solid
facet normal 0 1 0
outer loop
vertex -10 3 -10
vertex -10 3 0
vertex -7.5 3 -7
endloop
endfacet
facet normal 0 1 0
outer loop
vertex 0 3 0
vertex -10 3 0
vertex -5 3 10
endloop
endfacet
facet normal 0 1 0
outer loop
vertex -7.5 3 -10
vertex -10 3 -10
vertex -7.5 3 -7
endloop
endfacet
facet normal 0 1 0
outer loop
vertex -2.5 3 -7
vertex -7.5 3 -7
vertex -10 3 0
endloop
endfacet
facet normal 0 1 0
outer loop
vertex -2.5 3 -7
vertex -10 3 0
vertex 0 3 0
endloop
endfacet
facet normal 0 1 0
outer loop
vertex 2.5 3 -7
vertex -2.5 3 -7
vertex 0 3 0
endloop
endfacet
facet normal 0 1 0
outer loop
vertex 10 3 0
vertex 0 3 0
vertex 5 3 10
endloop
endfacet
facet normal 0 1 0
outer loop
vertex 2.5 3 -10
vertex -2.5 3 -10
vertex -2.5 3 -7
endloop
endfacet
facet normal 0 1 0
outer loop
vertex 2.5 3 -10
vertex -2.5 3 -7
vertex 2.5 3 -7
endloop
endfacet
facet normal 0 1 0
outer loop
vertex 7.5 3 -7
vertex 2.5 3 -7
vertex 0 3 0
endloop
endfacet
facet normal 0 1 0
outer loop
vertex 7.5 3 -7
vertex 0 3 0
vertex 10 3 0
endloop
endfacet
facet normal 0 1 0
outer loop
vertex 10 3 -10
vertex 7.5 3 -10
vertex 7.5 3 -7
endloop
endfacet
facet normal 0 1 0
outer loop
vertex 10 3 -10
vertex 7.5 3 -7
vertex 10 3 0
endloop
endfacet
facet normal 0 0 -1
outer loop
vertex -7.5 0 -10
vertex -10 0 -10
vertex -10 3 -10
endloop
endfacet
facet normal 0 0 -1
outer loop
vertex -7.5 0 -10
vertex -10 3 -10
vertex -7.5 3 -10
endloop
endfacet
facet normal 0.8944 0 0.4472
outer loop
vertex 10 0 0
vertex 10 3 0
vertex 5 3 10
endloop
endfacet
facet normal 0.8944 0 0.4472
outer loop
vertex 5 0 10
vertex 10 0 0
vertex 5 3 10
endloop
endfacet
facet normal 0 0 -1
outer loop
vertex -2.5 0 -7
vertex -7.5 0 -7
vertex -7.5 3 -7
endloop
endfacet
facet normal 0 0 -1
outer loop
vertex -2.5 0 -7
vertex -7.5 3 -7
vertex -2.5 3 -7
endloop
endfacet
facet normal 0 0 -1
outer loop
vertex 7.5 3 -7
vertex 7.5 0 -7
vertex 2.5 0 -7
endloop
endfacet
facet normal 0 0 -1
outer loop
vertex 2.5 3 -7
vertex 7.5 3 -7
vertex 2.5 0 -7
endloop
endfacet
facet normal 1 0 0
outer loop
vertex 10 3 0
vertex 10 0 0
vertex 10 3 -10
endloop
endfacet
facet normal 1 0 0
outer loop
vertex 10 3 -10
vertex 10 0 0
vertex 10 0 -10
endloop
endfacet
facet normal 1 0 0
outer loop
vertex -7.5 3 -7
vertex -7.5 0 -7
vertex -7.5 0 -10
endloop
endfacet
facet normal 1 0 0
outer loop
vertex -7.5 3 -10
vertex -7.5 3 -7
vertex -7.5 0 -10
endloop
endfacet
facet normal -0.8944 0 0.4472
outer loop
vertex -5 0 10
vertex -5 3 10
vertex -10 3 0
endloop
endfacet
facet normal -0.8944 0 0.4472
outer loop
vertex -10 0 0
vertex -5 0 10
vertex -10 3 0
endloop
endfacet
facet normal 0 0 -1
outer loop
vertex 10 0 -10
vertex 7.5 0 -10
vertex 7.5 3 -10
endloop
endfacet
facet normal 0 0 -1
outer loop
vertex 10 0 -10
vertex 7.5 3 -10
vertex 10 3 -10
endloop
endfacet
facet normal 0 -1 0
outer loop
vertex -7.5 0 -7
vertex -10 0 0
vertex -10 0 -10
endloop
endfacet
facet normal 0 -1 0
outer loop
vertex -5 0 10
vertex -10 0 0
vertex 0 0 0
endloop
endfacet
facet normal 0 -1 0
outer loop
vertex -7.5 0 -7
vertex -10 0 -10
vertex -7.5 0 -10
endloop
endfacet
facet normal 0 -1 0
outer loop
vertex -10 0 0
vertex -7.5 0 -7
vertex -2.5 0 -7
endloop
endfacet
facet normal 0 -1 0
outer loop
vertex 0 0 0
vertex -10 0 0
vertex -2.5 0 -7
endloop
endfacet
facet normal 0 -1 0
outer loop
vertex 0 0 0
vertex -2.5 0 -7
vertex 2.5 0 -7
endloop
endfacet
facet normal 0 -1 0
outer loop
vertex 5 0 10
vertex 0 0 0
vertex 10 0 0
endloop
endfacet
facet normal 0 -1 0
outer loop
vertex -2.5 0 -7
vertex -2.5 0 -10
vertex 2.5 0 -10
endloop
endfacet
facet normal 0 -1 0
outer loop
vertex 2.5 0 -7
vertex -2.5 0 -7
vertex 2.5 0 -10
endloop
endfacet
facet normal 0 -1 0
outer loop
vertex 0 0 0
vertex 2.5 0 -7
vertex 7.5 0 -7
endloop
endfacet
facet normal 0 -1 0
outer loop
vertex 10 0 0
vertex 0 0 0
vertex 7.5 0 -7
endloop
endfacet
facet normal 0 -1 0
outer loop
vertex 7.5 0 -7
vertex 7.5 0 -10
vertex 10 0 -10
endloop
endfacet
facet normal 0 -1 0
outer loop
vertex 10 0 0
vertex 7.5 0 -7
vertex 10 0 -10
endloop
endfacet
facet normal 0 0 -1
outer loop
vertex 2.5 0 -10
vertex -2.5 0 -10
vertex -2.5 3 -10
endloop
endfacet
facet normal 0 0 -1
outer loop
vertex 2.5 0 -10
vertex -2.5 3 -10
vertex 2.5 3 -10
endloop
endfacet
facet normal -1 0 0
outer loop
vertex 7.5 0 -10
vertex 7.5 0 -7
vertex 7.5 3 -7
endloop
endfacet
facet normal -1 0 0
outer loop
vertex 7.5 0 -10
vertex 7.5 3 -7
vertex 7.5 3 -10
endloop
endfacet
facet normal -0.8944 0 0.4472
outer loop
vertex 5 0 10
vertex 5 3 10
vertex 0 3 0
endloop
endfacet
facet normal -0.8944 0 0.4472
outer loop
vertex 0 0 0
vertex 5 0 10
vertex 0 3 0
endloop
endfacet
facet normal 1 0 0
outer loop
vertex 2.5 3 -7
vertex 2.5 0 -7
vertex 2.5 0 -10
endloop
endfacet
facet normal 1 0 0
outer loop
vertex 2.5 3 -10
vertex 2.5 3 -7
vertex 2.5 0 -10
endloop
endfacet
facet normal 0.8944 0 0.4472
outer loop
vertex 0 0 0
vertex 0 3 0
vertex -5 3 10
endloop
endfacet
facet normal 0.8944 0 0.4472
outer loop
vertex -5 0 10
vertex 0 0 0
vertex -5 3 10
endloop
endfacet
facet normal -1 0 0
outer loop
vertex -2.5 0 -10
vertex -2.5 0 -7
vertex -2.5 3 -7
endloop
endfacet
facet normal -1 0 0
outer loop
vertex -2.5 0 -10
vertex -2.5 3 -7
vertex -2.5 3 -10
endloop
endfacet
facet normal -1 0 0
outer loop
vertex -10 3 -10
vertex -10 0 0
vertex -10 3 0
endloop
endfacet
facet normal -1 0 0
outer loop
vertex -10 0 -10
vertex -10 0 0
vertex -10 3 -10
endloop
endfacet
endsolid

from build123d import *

# Parameters (mm, degrees)
SKETCH1_W               = 20
SKETCH1_H               = 20
BOSS_EXTRUDE1_DEPTH     = 3
CUT_EXTRUDE1_DEPTH      = 1
CUT_EXTRUDE1_DEPTH_BACK = 4
CUT_EXTRUDE2_START      = -4
SKETCH3_W               = 5
SKETCH3_H               = 3
CUT_EXTRUDE2_DEPTH      = 5


with BuildPart() as part:
    # Sketch1 → Boss-Extrude1 (new body)
    with BuildSketch(Plane(origin=(0, 0, 0), x_dir=(1, 0, 0), z_dir=(0, 1, 0))):
        Rectangle(SKETCH1_W, SKETCH1_H)
    extrude(amount=BOSS_EXTRUDE1_DEPTH)

    # Sketch2 → Cut-Extrude1 (cut, two sides)
    with BuildSketch(Plane(origin=(0, 3, 0), x_dir=(1, 0, 0), z_dir=(0, 1, 0))) as cut_extrude1_sk:
        Polygon((-5, -10), (-10, 0), (-10, -10), align=None)
        Polygon((0, 0), (-5, -10), (5, -10), align=None)
        Polygon((10, 0), (5, -10), (10, -10), align=None)
    extrude(amount=CUT_EXTRUDE1_DEPTH, mode=Mode.SUBTRACT)
    extrude(cut_extrude1_sk.sketch, amount=-CUT_EXTRUDE1_DEPTH_BACK, mode=Mode.SUBTRACT)

    # Sketch3 → Cut-Extrude2 (cut)
    with BuildSketch(Plane(origin=(0, 3, 0), x_dir=(1, 0, 0), z_dir=(0, 1, 0)).offset(CUT_EXTRUDE2_START)):
        with Locations((-5, 8.5)):
            Rectangle(SKETCH3_W, SKETCH3_H)
    cut_extrude2 = extrude(amount=CUT_EXTRUDE2_DEPTH, mode=Mode.SUBTRACT)

    # Mirror1: Cut-Extrude2 across plane
    add(cut_extrude2.mirror(Plane(origin=(0, 0, 0), x_dir=(0, 0, 1), z_dir=(1, 0, 0))), mode=Mode.SUBTRACT)


solid = part.part
